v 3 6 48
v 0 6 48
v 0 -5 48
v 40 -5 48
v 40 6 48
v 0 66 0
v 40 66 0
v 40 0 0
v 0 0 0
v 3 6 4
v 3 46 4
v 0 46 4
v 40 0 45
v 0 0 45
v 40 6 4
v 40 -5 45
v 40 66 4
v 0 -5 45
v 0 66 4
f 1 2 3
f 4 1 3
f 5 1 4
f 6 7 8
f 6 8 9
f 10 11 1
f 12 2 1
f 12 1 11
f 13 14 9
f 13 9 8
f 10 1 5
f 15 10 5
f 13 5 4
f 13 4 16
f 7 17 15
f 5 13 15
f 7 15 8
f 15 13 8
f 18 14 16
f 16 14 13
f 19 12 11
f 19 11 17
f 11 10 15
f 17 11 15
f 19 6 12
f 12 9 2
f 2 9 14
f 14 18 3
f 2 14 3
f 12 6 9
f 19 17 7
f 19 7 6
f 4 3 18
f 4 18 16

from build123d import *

# Parameters (mm, degrees)
F0_W     = 40
F0_H     = 40
F1_DEPTH = 4
F0_H_2   = 6
F2_DEPTH = 48
F3_W     = 40
F3_H     = 3
F4_DEPTH = 5
F6_DEPTH = 3
F7_DEPTH = 20


with BuildPart() as f1:
    # F0 (on Top) → F1 (new body)
    with BuildSketch(Plane.XY):
        with Locations((20, 26)):
            Rectangle(F0_W, F0_H)
    extrude(amount=F1_DEPTH)

    # F0 (on Top) → F2 (join)
    with BuildSketch(Plane.XY):
        with Locations((20, 3)):
            Rectangle(F0_W, F0_H_2)
    extrude(amount=F2_DEPTH)

    # F3 (on face) → F4 (join)
    with BuildSketch(Plane.XZ):
        with Locations((20, 46.5)):
            Rectangle(F3_W, F3_H)
    extrude(amount=F4_DEPTH)

    # F5 (on face) → F6 (join)
    with BuildSketch(Plane(origin=(0, 0, 0), x_dir=(0, -1, 0), z_dir=(-1, 0, 0))):
        Polygon((-6, 48), (-46, 4), (-6, 4), align=None)
    extrude(amount=-F6_DEPTH)

    # F1_face (on face) → F7 (join)
    with BuildSketch(Plane(origin=(20, 46, 2), x_dir=(-1, 0, 0), z_dir=(0, 1, 0))):
        Polygon((-20, 2), (-20, -2), (20, -2), (20, 2), (17, 2), align=None)
    extrude(amount=F7_DEPTH)


solid = f1.part
